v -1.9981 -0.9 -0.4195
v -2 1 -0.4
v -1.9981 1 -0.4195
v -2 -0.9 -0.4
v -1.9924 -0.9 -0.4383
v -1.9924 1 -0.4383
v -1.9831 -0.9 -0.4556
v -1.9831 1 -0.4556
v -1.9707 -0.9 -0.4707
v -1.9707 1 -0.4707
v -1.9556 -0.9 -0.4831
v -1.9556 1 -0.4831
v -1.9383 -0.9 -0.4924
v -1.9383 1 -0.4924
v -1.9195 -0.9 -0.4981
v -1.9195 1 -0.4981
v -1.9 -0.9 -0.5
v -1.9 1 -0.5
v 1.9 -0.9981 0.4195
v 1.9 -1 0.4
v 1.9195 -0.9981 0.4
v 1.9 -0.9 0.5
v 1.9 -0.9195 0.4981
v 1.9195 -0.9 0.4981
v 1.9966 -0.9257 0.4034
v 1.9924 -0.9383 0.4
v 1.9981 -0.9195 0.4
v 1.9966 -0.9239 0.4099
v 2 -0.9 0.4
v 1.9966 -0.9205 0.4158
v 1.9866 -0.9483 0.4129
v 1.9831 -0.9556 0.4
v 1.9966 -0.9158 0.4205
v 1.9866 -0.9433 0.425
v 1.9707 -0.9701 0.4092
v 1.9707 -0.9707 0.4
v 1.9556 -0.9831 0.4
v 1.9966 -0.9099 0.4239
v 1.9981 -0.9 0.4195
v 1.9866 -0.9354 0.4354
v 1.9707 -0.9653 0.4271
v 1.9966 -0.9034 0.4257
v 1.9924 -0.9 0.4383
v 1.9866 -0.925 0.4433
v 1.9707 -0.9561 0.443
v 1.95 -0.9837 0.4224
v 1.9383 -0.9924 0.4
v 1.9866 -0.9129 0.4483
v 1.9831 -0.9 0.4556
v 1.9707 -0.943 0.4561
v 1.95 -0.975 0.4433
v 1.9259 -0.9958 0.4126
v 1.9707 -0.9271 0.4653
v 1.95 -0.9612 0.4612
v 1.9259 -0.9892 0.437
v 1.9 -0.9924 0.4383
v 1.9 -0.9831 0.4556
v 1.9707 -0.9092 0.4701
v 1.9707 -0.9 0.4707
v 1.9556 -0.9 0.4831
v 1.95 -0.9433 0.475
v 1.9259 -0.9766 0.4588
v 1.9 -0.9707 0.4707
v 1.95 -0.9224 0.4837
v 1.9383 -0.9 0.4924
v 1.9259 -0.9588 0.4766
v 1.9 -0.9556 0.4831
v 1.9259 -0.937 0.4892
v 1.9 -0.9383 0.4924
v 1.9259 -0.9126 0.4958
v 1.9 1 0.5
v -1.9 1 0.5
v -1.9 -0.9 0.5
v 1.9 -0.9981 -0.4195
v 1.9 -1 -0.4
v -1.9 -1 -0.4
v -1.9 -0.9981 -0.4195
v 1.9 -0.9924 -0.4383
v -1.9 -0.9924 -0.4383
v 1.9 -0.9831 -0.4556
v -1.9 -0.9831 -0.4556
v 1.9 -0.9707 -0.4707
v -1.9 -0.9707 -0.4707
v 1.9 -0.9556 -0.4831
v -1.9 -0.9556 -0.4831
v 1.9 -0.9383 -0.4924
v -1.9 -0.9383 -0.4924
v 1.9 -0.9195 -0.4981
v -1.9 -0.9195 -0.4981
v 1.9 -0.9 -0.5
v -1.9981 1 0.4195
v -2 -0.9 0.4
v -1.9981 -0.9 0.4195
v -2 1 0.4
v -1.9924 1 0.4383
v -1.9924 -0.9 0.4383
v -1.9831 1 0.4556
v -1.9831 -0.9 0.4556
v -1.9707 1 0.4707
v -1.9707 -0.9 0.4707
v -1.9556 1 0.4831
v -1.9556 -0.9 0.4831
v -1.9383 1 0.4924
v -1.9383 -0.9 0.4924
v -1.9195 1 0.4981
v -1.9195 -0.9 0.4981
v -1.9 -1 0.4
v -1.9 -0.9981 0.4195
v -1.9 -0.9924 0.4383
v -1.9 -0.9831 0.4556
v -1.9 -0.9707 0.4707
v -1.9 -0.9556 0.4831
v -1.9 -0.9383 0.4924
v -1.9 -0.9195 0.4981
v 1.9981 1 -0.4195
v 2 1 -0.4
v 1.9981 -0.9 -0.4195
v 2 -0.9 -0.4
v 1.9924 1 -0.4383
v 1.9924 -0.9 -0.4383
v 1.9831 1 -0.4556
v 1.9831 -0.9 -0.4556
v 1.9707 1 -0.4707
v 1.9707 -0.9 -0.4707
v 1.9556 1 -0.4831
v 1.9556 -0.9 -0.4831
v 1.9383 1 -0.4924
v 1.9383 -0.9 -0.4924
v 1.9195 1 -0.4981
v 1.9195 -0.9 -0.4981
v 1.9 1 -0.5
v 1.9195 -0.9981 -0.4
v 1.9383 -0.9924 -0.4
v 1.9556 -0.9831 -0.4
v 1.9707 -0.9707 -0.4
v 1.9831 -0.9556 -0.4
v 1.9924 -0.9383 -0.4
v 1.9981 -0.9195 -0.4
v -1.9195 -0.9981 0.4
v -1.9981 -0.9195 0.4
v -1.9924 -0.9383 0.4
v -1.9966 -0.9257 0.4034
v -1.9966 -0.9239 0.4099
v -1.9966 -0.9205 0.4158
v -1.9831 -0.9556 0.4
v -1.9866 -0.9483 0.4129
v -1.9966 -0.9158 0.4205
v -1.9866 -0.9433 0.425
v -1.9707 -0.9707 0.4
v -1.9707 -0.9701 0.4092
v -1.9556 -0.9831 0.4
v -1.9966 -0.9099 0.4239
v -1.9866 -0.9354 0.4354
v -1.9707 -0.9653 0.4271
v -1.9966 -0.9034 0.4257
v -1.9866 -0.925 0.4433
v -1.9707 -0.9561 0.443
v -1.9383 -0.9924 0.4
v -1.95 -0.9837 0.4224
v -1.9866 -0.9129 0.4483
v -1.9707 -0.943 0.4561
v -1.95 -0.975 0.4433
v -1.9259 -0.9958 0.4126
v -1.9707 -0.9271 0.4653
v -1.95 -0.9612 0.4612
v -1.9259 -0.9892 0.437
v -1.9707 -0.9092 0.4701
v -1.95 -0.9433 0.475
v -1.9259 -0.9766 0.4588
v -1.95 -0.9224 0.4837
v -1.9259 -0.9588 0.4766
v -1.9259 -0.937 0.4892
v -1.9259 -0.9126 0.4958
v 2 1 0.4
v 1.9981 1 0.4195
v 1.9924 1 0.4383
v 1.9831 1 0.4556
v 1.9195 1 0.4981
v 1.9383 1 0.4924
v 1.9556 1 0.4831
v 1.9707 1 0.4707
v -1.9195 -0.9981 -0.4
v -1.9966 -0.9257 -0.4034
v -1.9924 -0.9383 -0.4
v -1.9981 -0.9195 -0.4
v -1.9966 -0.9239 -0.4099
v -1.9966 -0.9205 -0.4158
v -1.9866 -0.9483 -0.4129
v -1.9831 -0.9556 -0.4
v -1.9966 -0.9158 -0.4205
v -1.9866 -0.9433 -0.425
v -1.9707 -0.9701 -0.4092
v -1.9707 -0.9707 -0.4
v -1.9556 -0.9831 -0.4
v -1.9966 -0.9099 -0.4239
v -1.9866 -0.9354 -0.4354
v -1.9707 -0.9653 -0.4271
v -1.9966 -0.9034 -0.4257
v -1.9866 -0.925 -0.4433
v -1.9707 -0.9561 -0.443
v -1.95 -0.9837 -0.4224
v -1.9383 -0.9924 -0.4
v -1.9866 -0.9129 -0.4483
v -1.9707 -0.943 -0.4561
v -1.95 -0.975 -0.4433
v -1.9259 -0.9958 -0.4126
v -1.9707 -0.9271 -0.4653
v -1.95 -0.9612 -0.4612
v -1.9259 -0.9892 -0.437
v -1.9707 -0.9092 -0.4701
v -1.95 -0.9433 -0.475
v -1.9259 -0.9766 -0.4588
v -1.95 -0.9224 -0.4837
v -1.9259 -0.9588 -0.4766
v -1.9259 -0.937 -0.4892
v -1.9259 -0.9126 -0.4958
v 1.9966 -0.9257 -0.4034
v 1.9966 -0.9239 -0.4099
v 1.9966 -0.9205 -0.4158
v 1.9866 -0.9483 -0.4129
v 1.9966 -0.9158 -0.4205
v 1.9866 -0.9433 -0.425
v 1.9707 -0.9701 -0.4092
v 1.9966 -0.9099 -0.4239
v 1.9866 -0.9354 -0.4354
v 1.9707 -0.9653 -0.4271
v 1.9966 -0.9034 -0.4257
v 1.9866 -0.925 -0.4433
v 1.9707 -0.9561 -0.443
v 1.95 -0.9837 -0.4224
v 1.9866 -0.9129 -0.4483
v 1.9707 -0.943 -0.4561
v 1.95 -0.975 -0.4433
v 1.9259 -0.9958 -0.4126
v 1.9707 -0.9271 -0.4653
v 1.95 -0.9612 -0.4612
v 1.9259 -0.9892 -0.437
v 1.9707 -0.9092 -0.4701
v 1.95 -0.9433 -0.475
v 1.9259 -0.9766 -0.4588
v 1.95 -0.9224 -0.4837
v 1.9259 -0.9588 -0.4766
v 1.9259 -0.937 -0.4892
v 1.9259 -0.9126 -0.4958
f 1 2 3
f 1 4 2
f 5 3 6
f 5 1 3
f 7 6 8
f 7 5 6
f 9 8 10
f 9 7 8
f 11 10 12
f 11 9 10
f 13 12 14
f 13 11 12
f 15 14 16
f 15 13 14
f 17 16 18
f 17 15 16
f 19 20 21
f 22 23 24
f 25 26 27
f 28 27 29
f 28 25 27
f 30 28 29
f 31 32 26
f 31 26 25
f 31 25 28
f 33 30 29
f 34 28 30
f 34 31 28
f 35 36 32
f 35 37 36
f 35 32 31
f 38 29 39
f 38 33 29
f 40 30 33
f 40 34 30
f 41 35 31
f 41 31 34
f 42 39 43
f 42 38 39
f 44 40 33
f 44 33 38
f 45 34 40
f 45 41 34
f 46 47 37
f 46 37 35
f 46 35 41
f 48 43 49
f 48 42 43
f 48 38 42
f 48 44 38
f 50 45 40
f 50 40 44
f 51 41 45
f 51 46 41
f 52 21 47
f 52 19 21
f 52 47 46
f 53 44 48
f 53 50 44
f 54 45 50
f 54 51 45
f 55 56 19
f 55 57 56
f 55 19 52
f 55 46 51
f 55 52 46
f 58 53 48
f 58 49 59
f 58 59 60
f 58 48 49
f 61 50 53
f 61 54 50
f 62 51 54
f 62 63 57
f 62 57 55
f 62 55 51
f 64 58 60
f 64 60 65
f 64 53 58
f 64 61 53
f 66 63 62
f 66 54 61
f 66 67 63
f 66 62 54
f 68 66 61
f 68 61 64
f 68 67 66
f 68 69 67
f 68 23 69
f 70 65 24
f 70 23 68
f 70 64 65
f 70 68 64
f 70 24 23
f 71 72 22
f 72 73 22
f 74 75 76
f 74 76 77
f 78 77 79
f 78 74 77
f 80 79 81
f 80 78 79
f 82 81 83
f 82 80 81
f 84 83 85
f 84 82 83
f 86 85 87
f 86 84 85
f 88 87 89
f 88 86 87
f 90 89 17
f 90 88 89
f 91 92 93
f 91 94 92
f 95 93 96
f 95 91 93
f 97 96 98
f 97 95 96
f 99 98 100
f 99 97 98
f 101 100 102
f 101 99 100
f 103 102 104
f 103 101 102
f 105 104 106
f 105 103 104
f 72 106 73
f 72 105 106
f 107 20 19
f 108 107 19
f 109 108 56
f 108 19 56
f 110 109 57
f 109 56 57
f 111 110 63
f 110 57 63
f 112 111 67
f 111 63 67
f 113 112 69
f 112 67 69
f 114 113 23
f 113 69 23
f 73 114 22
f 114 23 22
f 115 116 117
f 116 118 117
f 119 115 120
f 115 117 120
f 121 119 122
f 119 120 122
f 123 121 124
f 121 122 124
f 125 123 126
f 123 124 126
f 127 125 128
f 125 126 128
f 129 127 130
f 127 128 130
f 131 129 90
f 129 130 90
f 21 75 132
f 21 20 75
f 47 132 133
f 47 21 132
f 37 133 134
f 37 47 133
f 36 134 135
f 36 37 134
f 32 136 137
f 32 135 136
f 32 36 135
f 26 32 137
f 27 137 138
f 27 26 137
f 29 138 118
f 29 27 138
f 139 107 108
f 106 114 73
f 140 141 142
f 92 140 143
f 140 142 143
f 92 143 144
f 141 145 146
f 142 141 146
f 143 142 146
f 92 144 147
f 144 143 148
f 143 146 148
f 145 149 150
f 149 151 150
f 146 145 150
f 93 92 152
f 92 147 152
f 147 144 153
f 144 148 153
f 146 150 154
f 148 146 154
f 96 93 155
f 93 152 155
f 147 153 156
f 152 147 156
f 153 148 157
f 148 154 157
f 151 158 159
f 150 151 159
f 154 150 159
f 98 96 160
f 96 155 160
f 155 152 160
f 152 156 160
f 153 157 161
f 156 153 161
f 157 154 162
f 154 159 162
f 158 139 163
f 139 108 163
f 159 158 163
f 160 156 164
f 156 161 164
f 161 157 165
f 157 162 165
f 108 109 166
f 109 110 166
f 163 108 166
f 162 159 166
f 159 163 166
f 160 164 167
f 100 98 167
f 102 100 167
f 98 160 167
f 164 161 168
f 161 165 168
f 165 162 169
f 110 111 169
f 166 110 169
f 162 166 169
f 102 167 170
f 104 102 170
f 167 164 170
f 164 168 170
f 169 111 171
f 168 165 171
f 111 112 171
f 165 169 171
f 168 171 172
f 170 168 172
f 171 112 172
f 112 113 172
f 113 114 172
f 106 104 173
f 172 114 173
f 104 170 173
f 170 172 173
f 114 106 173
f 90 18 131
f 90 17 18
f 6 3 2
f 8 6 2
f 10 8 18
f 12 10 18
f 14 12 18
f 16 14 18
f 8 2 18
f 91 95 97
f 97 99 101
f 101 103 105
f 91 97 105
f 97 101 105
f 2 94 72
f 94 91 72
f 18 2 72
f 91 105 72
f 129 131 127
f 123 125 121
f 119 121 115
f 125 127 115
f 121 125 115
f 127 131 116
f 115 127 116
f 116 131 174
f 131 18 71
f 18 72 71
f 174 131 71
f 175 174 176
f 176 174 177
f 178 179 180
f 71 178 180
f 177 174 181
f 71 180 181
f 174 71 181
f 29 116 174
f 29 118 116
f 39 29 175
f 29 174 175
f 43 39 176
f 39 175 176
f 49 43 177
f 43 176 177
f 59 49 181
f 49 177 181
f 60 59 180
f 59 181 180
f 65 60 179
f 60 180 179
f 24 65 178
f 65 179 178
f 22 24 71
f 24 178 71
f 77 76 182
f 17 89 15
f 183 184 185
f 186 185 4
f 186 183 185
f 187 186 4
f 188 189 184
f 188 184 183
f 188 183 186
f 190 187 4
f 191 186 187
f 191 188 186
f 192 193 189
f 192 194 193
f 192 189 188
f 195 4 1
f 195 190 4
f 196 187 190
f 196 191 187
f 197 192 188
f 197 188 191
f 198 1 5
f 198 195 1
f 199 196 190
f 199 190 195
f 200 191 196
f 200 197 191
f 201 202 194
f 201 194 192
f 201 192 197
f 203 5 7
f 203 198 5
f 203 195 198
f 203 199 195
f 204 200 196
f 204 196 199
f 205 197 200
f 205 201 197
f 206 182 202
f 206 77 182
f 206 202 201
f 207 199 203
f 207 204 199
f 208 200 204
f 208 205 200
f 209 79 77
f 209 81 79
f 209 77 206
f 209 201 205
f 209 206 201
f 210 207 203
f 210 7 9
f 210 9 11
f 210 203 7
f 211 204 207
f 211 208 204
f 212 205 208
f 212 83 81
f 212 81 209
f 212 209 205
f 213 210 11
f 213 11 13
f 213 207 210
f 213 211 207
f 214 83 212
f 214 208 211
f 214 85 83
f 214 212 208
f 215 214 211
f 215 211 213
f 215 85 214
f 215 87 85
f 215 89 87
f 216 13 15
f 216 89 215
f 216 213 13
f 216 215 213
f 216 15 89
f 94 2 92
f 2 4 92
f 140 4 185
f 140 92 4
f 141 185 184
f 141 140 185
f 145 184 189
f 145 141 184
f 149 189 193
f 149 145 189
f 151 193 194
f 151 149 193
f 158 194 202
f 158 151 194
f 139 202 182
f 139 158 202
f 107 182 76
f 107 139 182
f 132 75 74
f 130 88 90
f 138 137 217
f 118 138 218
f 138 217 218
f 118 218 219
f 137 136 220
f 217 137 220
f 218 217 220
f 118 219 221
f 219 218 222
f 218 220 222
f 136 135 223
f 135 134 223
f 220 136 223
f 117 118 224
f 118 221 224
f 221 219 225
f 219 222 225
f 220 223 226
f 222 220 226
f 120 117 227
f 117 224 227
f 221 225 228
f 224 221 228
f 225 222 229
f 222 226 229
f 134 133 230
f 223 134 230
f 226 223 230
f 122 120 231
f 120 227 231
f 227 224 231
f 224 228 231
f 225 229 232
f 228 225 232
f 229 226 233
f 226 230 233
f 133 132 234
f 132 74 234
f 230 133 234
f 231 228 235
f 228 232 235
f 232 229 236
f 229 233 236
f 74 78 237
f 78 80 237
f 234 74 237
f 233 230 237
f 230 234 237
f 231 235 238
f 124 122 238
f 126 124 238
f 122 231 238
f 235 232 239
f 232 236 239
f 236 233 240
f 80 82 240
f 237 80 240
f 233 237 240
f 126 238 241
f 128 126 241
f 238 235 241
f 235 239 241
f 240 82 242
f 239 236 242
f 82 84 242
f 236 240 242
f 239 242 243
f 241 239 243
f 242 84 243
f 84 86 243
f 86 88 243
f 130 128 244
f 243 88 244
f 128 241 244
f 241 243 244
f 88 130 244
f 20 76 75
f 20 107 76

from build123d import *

# Parameters (mm, degrees)
F0_W     = 4
F0_H     = 1
F1_DEPTH = 1
F2_R     = 0.1


with BuildPart() as f1:
    # F0 (on Front) → F1 (new body, symmetric)
    with BuildSketch(Plane.XZ):
        Rectangle(F0_W, F0_H)
    extrude(amount=F1_DEPTH, both=True)

    # F2
    f2_edges = [f1.edges().sort_by_distance(p)[0] for p in [
        (0, -1, -0.5),
        (0, -1, 0.5),
        (2, -1, 0),
        (-2, -1, 0),
        (-2, 0, 0.5),
        (2, 0, 0.5),
        (2, 0, -0.5),
        (-2, 0, -0.5),
    ]]
    fillet(f2_edges, radius=F2_R)


solid = f1.part
